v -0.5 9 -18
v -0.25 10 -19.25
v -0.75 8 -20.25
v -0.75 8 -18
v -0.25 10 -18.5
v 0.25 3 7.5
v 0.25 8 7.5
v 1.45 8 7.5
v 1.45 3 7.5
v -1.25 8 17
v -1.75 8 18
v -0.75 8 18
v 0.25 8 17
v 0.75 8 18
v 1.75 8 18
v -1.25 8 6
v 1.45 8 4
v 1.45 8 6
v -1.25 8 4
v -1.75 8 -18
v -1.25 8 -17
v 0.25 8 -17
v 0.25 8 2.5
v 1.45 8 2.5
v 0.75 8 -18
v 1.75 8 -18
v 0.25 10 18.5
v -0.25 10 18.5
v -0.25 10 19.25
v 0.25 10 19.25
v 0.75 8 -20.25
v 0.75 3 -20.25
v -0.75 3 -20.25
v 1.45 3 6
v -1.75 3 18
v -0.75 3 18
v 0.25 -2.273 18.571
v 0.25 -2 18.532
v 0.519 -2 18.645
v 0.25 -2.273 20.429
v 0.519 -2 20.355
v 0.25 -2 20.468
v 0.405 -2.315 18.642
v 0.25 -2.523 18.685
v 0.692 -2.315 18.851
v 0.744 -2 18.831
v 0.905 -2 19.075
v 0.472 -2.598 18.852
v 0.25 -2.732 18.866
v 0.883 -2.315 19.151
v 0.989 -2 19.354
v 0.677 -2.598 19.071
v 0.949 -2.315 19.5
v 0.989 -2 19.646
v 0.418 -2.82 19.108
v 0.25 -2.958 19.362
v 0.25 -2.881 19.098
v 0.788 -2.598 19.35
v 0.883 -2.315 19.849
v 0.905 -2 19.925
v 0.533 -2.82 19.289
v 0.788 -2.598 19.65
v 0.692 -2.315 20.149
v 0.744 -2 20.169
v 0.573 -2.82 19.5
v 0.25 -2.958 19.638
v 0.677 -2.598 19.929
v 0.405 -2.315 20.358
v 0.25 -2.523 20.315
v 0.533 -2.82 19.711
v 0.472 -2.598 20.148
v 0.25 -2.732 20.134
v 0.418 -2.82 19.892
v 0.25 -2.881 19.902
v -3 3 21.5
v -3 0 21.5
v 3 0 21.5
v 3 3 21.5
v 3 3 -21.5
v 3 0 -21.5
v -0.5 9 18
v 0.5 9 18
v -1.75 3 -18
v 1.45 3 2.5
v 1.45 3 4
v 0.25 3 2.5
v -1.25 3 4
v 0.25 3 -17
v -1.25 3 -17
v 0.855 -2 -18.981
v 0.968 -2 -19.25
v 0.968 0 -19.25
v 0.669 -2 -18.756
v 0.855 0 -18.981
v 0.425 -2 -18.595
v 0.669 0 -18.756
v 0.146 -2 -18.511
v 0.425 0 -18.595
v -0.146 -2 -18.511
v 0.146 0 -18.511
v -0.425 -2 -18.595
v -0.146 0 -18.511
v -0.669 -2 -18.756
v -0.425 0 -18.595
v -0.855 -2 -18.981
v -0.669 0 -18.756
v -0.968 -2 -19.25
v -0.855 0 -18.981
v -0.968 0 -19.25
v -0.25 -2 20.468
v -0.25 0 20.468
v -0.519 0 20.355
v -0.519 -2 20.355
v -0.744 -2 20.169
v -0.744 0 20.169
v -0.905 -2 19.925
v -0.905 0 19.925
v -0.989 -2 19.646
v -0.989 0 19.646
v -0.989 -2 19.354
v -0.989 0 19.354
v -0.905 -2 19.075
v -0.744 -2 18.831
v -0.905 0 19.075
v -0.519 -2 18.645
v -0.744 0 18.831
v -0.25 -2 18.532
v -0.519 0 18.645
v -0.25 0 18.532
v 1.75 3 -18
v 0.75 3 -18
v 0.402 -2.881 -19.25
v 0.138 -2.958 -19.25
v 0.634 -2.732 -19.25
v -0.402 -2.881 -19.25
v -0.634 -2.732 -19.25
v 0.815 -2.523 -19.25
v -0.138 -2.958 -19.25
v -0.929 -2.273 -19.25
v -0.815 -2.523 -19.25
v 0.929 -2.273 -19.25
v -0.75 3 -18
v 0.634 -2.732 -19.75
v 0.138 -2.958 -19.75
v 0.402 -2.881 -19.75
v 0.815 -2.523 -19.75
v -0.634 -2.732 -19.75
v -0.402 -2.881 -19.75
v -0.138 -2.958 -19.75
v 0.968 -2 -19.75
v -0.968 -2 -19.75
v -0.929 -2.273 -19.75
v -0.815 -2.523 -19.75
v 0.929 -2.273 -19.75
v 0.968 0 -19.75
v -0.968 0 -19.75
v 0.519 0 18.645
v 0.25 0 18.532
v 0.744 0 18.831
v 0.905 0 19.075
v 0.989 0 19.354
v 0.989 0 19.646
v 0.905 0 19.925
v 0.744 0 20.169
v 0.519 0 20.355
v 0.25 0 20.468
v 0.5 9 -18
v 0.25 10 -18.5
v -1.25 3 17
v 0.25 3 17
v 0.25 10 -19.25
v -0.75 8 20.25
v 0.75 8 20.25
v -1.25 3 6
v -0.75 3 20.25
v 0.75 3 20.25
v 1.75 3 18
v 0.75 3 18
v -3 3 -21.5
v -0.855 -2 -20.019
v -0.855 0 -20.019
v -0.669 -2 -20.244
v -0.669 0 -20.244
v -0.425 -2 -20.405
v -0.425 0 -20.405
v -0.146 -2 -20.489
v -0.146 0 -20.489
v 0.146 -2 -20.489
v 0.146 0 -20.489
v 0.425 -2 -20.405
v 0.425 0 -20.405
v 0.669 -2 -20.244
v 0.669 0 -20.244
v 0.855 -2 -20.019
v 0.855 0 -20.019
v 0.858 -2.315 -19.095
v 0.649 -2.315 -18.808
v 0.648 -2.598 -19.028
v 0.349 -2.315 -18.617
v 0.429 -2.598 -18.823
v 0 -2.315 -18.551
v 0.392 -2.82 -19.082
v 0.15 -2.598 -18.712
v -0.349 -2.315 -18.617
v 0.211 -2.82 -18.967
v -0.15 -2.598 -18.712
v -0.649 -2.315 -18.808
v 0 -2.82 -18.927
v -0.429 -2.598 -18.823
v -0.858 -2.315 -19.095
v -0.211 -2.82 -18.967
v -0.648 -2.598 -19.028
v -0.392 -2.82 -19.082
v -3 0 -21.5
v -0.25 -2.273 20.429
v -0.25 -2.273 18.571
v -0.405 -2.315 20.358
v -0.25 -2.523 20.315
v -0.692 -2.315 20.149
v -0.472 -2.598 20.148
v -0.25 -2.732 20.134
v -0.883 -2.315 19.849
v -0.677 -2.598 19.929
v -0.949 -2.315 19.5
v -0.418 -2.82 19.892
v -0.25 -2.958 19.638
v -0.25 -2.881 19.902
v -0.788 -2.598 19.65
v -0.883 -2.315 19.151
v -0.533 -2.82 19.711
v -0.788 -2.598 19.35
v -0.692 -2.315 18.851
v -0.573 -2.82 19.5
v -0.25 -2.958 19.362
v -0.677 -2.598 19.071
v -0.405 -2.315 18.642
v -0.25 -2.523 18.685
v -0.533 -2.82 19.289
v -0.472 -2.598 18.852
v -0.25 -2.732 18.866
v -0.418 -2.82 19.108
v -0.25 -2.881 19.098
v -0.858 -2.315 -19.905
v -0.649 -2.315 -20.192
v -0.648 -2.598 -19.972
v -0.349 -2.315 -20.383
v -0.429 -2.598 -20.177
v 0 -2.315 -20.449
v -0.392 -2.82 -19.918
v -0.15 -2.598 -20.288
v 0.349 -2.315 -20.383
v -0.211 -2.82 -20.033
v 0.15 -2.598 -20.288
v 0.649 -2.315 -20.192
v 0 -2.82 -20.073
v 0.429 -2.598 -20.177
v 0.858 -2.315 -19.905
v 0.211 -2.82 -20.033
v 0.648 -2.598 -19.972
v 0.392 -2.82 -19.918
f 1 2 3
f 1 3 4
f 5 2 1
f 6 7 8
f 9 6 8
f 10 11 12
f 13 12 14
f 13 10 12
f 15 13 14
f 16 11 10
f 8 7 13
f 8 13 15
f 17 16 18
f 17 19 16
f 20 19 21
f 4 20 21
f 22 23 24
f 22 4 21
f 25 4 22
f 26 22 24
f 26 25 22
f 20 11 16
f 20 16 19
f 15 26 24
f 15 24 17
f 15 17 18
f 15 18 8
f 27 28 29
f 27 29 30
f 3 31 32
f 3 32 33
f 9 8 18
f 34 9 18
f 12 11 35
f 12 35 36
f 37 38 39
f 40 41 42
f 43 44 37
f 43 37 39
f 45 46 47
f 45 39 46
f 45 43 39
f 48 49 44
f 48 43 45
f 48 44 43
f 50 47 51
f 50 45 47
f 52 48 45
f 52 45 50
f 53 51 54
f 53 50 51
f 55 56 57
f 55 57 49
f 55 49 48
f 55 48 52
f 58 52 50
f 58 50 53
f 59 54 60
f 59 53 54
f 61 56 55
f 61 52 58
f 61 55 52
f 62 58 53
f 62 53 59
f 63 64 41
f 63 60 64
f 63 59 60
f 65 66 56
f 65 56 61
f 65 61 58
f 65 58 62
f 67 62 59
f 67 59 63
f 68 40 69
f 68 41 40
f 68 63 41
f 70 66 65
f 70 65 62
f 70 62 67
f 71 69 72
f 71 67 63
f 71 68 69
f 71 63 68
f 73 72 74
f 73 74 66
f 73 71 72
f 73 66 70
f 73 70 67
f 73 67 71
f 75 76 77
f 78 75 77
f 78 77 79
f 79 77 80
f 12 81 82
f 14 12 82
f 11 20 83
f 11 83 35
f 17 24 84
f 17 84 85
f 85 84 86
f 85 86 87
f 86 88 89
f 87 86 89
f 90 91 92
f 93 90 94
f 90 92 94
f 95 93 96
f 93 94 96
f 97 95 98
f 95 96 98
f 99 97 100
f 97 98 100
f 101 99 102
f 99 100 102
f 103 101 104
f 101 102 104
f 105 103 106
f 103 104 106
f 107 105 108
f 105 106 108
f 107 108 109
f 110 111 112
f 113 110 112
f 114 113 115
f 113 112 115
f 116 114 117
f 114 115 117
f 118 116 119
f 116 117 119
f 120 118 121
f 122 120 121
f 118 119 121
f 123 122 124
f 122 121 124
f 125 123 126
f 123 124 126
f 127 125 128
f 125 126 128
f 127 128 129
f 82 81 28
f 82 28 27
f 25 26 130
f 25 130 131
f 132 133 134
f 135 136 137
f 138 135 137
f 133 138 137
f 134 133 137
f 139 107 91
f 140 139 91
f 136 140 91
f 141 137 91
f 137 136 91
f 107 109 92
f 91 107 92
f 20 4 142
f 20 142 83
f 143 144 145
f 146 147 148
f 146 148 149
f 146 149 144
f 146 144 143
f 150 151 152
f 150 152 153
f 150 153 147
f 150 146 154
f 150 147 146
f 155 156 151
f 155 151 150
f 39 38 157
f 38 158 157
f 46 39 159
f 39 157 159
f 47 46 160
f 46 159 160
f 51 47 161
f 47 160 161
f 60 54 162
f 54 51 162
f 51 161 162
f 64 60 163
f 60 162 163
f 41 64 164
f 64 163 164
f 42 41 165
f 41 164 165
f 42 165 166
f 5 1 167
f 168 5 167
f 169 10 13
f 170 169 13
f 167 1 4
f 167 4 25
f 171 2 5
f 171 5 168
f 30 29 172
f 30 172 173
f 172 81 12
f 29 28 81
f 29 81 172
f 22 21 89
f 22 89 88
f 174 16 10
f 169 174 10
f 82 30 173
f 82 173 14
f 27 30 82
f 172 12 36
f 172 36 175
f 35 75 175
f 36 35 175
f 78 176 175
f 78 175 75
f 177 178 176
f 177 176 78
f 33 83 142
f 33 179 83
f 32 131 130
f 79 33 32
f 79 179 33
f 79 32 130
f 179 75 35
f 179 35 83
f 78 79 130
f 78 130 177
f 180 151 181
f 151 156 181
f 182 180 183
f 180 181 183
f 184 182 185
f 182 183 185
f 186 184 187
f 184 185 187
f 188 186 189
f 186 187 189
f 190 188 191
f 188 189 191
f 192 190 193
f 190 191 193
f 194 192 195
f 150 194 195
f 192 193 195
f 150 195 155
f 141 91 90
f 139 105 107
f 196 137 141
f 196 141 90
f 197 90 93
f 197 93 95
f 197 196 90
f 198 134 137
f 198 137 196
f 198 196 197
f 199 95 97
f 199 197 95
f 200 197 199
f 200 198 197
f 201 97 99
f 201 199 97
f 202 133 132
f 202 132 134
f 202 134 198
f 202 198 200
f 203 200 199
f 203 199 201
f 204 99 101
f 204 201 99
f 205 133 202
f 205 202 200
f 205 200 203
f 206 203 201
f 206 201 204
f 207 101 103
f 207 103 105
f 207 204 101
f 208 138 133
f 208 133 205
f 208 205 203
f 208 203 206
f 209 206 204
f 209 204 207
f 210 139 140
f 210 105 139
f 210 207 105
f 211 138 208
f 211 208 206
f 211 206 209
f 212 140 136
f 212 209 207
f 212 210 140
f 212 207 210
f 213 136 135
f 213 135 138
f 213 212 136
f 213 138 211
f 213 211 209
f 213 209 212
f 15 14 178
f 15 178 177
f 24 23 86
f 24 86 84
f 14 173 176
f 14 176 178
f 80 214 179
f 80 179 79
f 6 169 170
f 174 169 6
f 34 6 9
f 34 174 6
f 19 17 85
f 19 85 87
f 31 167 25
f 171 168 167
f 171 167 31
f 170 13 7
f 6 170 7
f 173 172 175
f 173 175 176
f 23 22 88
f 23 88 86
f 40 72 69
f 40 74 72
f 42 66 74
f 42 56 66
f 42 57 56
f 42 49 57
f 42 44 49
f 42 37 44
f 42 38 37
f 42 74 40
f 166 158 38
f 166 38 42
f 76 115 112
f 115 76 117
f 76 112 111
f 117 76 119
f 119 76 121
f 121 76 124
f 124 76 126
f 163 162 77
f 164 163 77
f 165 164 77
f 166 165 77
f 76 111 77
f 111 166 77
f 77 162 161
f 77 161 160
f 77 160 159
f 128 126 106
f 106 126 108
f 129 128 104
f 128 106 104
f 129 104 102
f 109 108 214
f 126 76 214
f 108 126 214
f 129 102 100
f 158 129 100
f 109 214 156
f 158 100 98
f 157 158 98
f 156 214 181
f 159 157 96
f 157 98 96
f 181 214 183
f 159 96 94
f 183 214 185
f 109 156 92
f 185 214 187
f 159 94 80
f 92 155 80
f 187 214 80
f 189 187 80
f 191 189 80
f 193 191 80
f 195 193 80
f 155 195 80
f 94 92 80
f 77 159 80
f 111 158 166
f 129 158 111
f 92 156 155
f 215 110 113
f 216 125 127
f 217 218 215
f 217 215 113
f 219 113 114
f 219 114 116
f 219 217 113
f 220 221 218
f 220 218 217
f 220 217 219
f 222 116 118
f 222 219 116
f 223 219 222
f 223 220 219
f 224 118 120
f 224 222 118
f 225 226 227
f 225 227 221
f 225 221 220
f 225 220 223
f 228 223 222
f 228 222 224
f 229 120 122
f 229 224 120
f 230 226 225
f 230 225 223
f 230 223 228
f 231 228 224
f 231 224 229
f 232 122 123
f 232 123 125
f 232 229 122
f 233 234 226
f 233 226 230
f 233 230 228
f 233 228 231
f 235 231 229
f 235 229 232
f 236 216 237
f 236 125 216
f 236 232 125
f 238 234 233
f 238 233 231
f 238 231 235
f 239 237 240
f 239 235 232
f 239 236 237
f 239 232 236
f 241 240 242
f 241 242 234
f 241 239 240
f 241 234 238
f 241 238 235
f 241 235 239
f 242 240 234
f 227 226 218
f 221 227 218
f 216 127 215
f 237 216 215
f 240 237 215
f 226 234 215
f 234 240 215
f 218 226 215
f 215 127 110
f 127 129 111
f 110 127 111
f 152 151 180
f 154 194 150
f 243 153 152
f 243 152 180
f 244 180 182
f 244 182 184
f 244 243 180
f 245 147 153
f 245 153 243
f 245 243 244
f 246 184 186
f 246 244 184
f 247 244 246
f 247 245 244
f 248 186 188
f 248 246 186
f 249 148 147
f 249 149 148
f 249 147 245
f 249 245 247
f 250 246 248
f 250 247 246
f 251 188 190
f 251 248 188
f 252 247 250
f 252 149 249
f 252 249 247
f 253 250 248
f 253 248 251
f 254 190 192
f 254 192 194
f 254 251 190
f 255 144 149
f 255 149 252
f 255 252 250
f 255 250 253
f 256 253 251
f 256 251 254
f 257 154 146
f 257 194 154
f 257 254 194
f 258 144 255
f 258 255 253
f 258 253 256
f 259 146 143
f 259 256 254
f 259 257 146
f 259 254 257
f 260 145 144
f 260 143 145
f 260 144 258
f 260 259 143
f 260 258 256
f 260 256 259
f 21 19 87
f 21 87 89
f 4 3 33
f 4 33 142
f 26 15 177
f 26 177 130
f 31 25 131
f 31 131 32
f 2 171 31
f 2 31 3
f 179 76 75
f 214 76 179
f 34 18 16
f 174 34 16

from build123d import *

# Parameters (mm, degrees)
SKETCH_1_W             = 6
SKETCH_1_H             = 43
EXTRUDE_1_DEPTH        = 10
SKETCH_3_R             = 1
EXTRUDE_2_DEPTH        = 3
FILLET_1_R             = 1
SKETCH_4_W             = 0.5
SKETCH_4_H             = 2
SKETCH_4_W_2           = 2
SKETCH_4_H_2           = 0.5
CUT_EXTRUDE_1_DEPTH    = 4
SKETCH_5_OUTSIDE_W     = 17.062
SKETCH_5_OUTSIDE_H     = 54.062
CUT_EXTRUDE_2_DEPTH    = 7
CUT_EXTRUDE_3_DEPTH    = 7
SKETCH_7_W             = 3.5
SKETCH_7_H             = 36
CUT_EXTRUDE_4_DEPTH    = 2
CHAMFER_1_SIZE         = 2
CHAMFER_1_SIZE2        = 0.5
CHAMFER_1_PART_2_SIZE  = 2
CHAMFER_1_PART_2_SIZE2 = 0.5
CHAMFER_2_SIZE         = 2
CHAMFER_2_SIZE2        = 0.5
CHAMFER_2_PART_2_SIZE  = 2
CHAMFER_2_PART_2_SIZE2 = 0.5
CHAMFER_3_SIZE         = 2
CHAMFER_3_SIZE2        = 1
CHAMFER_3_PART_2_SIZE  = 2
CHAMFER_3_PART_2_SIZE2 = 1
CHAMFER_4_SIZE         = 0.5
CHAMFER_4_SIZE2        = 1
CHAMFER_4_PART_2_SIZE  = 0.5
CHAMFER_4_PART_2_SIZE2 = 1


with BuildPart() as part:
    # 草图1 → 凸台-拉伸1 (new body)
    with BuildSketch(Plane(origin=(0, 0, 0), x_dir=(1, 0, 0), z_dir=(0, 1, 0))):
        Rectangle(SKETCH_1_W, SKETCH_1_H)
    extrude(amount=EXTRUDE_1_DEPTH)

    # 草图3 → 凸台-拉伸2 (add)
    with BuildSketch(Plane.XZ):
        with Locations((0, 19.5)):
            Circle(SKETCH_3_R)
        with Locations((0, -19.5)):
            Circle(SKETCH_3_R)
    extrude(amount=EXTRUDE_2_DEPTH)

    # 圆角1
    fillet_1_edges = [part.edges().sort_by_distance(p)[0] for p in [
        (-1, -3, 19.5),
        (-1, -3, -19.5),
    ]]
    fillet(fillet_1_edges, radius=FILLET_1_R)

    # 草图4 → 切除-拉伸1 (cut, through all)
    with BuildSketch(Plane.XZ):
        with Locations((0, 19.5)):
            Rectangle(SKETCH_4_W, SKETCH_4_H)
        with Locations((0, -19.5)):
            Rectangle(SKETCH_4_W_2, SKETCH_4_H_2)
    extrude(amount=CUT_EXTRUDE_1_DEPTH, mode=Mode.SUBTRACT)

    # 草图5 outside → 切除-拉伸2 (cut)
    with BuildSketch(Plane(origin=(0, 10, 0), x_dir=(1, 0, 0), z_dir=(0, 1, 0))):
        Rectangle(SKETCH_5_OUTSIDE_W, SKETCH_5_OUTSIDE_H)
        Polygon((-0.75, -20.25), (0.75, -20.25), (0.75, -18), (1.75, -18), (1.75, 18), (0.75, 18), (0.75, 20.25), (-0.75, 20.25), (-0.75, 18), (-1.75, 18), (-1.75, -18), (-0.75, -18), align=None, mode=Mode.SUBTRACT)
    extrude(amount=-CUT_EXTRUDE_2_DEPTH, mode=Mode.SUBTRACT)

    # 草图6 → 切除-拉伸3 (cut)
    with BuildSketch(Plane(origin=(0, 10, 0), x_dir=(1, 0, 0), z_dir=(0, 1, 0))):
        Polygon((-1.25, 17), (0.25, 17), (0.25, -2.5), (1.45, -2.5), (1.45, -4), (-1.25, -4), align=None)
        Polygon((-1.25, -17), (0.25, -17), (0.25, -7.5), (1.45, -7.5), (1.45, -6), (-1.25, -6), align=None)
    extrude(amount=-CUT_EXTRUDE_3_DEPTH, mode=Mode.SUBTRACT)

    # 草图7 → 切除-拉伸4 (cut)
    with BuildSketch(Plane(origin=(0, 10, 0), x_dir=(1, 0, 0), z_dir=(0, 1, 0))):
        Rectangle(SKETCH_7_W, SKETCH_7_H)
    extrude(amount=-CUT_EXTRUDE_4_DEPTH, mode=Mode.SUBTRACT)

    # 倒角1
    chamfer_1_edges = [part.edges().sort_by_distance(p)[0] for p in [
        (0.75, 10, -19.125),
    ]]
    chamfer_1_side = [part.faces().sort_by_distance(p)[0] for p in [
        (0.75, 6.5, -19.125),
    ]]
    chamfer(chamfer_1_edges, length=CHAMFER_1_SIZE, length2=CHAMFER_1_SIZE2, reference=chamfer_1_side[0])

    # 倒角1 part 2
    chamfer_1_part_2_edges = [part.edges().sort_by_distance(p)[0] for p in [
        (-0.75, 10, -19.125),
    ]]
    chamfer_1_part_2_side = [part.faces().sort_by_distance(p)[0] for p in [
        (-0.75, 6.5, -19.125),
    ]]
    chamfer(chamfer_1_part_2_edges, length=CHAMFER_1_PART_2_SIZE, length2=CHAMFER_1_PART_2_SIZE2, reference=chamfer_1_part_2_side[0])

    # 倒角2
    chamfer_2_edges = [part.edges().sort_by_distance(p)[0] for p in [
        (0.75, 10, 19.125),
    ]]
    chamfer_2_side = [part.faces().sort_by_distance(p)[0] for p in [
        (0.75, 6.5, 19.125),
    ]]
    chamfer(chamfer_2_edges, length=CHAMFER_2_SIZE, length2=CHAMFER_2_SIZE2, reference=chamfer_2_side[0])

    # 倒角2 part 2
    chamfer_2_part_2_edges = [part.edges().sort_by_distance(p)[0] for p in [
        (-0.75, 10, 19.125),
    ]]
    chamfer_2_part_2_side = [part.faces().sort_by_distance(p)[0] for p in [
        (-0.75, 6.5, 19.125),
    ]]
    chamfer(chamfer_2_part_2_edges, length=CHAMFER_2_PART_2_SIZE, length2=CHAMFER_2_PART_2_SIZE2, reference=chamfer_2_part_2_side[0])

    # 倒角3
    chamfer_3_edges = [part.edges().sort_by_distance(p)[0] for p in [
        (0, 10, -20.25),
    ]]
    chamfer_3_side = [part.faces().sort_by_distance(p)[0] for p in [
        (0, 6.201754386, -20.25),
    ]]
    chamfer(chamfer_3_edges, length=CHAMFER_3_SIZE, length2=CHAMFER_3_SIZE2, reference=chamfer_3_side[0])

    # 倒角3 part 2
    chamfer_3_part_2_edges = [part.edges().sort_by_distance(p)[0] for p in [
        (0, 10, 20.25),
    ]]
    chamfer_3_part_2_side = [part.faces().sort_by_distance(p)[0] for p in [
        (0, 6.201754386, 20.25),
    ]]
    chamfer(chamfer_3_part_2_edges, length=CHAMFER_3_PART_2_SIZE, length2=CHAMFER_3_PART_2_SIZE2, reference=chamfer_3_part_2_side[0])

    # 倒角4
    chamfer_4_edges = [part.edges().sort_by_distance(p)[0] for p in [
        (0, 10, -18),
    ]]
    chamfer_4_side = [part.faces().sort_by_distance(p)[0] for p in [
        (0, 10, -18.625),
    ]]
    chamfer(chamfer_4_edges, length=CHAMFER_4_SIZE, length2=CHAMFER_4_SIZE2, reference=chamfer_4_side[0])

    # 倒角4 part 2
    chamfer_4_part_2_edges = [part.edges().sort_by_distance(p)[0] for p in [
        (0, 10, 18),
    ]]
    chamfer_4_part_2_side = [part.faces().sort_by_distance(p)[0] for p in [
        (0, 10, 18.625),
    ]]
    chamfer(chamfer_4_part_2_edges, length=CHAMFER_4_PART_2_SIZE, length2=CHAMFER_4_PART_2_SIZE2, reference=chamfer_4_part_2_side[0])


solid = part.part
